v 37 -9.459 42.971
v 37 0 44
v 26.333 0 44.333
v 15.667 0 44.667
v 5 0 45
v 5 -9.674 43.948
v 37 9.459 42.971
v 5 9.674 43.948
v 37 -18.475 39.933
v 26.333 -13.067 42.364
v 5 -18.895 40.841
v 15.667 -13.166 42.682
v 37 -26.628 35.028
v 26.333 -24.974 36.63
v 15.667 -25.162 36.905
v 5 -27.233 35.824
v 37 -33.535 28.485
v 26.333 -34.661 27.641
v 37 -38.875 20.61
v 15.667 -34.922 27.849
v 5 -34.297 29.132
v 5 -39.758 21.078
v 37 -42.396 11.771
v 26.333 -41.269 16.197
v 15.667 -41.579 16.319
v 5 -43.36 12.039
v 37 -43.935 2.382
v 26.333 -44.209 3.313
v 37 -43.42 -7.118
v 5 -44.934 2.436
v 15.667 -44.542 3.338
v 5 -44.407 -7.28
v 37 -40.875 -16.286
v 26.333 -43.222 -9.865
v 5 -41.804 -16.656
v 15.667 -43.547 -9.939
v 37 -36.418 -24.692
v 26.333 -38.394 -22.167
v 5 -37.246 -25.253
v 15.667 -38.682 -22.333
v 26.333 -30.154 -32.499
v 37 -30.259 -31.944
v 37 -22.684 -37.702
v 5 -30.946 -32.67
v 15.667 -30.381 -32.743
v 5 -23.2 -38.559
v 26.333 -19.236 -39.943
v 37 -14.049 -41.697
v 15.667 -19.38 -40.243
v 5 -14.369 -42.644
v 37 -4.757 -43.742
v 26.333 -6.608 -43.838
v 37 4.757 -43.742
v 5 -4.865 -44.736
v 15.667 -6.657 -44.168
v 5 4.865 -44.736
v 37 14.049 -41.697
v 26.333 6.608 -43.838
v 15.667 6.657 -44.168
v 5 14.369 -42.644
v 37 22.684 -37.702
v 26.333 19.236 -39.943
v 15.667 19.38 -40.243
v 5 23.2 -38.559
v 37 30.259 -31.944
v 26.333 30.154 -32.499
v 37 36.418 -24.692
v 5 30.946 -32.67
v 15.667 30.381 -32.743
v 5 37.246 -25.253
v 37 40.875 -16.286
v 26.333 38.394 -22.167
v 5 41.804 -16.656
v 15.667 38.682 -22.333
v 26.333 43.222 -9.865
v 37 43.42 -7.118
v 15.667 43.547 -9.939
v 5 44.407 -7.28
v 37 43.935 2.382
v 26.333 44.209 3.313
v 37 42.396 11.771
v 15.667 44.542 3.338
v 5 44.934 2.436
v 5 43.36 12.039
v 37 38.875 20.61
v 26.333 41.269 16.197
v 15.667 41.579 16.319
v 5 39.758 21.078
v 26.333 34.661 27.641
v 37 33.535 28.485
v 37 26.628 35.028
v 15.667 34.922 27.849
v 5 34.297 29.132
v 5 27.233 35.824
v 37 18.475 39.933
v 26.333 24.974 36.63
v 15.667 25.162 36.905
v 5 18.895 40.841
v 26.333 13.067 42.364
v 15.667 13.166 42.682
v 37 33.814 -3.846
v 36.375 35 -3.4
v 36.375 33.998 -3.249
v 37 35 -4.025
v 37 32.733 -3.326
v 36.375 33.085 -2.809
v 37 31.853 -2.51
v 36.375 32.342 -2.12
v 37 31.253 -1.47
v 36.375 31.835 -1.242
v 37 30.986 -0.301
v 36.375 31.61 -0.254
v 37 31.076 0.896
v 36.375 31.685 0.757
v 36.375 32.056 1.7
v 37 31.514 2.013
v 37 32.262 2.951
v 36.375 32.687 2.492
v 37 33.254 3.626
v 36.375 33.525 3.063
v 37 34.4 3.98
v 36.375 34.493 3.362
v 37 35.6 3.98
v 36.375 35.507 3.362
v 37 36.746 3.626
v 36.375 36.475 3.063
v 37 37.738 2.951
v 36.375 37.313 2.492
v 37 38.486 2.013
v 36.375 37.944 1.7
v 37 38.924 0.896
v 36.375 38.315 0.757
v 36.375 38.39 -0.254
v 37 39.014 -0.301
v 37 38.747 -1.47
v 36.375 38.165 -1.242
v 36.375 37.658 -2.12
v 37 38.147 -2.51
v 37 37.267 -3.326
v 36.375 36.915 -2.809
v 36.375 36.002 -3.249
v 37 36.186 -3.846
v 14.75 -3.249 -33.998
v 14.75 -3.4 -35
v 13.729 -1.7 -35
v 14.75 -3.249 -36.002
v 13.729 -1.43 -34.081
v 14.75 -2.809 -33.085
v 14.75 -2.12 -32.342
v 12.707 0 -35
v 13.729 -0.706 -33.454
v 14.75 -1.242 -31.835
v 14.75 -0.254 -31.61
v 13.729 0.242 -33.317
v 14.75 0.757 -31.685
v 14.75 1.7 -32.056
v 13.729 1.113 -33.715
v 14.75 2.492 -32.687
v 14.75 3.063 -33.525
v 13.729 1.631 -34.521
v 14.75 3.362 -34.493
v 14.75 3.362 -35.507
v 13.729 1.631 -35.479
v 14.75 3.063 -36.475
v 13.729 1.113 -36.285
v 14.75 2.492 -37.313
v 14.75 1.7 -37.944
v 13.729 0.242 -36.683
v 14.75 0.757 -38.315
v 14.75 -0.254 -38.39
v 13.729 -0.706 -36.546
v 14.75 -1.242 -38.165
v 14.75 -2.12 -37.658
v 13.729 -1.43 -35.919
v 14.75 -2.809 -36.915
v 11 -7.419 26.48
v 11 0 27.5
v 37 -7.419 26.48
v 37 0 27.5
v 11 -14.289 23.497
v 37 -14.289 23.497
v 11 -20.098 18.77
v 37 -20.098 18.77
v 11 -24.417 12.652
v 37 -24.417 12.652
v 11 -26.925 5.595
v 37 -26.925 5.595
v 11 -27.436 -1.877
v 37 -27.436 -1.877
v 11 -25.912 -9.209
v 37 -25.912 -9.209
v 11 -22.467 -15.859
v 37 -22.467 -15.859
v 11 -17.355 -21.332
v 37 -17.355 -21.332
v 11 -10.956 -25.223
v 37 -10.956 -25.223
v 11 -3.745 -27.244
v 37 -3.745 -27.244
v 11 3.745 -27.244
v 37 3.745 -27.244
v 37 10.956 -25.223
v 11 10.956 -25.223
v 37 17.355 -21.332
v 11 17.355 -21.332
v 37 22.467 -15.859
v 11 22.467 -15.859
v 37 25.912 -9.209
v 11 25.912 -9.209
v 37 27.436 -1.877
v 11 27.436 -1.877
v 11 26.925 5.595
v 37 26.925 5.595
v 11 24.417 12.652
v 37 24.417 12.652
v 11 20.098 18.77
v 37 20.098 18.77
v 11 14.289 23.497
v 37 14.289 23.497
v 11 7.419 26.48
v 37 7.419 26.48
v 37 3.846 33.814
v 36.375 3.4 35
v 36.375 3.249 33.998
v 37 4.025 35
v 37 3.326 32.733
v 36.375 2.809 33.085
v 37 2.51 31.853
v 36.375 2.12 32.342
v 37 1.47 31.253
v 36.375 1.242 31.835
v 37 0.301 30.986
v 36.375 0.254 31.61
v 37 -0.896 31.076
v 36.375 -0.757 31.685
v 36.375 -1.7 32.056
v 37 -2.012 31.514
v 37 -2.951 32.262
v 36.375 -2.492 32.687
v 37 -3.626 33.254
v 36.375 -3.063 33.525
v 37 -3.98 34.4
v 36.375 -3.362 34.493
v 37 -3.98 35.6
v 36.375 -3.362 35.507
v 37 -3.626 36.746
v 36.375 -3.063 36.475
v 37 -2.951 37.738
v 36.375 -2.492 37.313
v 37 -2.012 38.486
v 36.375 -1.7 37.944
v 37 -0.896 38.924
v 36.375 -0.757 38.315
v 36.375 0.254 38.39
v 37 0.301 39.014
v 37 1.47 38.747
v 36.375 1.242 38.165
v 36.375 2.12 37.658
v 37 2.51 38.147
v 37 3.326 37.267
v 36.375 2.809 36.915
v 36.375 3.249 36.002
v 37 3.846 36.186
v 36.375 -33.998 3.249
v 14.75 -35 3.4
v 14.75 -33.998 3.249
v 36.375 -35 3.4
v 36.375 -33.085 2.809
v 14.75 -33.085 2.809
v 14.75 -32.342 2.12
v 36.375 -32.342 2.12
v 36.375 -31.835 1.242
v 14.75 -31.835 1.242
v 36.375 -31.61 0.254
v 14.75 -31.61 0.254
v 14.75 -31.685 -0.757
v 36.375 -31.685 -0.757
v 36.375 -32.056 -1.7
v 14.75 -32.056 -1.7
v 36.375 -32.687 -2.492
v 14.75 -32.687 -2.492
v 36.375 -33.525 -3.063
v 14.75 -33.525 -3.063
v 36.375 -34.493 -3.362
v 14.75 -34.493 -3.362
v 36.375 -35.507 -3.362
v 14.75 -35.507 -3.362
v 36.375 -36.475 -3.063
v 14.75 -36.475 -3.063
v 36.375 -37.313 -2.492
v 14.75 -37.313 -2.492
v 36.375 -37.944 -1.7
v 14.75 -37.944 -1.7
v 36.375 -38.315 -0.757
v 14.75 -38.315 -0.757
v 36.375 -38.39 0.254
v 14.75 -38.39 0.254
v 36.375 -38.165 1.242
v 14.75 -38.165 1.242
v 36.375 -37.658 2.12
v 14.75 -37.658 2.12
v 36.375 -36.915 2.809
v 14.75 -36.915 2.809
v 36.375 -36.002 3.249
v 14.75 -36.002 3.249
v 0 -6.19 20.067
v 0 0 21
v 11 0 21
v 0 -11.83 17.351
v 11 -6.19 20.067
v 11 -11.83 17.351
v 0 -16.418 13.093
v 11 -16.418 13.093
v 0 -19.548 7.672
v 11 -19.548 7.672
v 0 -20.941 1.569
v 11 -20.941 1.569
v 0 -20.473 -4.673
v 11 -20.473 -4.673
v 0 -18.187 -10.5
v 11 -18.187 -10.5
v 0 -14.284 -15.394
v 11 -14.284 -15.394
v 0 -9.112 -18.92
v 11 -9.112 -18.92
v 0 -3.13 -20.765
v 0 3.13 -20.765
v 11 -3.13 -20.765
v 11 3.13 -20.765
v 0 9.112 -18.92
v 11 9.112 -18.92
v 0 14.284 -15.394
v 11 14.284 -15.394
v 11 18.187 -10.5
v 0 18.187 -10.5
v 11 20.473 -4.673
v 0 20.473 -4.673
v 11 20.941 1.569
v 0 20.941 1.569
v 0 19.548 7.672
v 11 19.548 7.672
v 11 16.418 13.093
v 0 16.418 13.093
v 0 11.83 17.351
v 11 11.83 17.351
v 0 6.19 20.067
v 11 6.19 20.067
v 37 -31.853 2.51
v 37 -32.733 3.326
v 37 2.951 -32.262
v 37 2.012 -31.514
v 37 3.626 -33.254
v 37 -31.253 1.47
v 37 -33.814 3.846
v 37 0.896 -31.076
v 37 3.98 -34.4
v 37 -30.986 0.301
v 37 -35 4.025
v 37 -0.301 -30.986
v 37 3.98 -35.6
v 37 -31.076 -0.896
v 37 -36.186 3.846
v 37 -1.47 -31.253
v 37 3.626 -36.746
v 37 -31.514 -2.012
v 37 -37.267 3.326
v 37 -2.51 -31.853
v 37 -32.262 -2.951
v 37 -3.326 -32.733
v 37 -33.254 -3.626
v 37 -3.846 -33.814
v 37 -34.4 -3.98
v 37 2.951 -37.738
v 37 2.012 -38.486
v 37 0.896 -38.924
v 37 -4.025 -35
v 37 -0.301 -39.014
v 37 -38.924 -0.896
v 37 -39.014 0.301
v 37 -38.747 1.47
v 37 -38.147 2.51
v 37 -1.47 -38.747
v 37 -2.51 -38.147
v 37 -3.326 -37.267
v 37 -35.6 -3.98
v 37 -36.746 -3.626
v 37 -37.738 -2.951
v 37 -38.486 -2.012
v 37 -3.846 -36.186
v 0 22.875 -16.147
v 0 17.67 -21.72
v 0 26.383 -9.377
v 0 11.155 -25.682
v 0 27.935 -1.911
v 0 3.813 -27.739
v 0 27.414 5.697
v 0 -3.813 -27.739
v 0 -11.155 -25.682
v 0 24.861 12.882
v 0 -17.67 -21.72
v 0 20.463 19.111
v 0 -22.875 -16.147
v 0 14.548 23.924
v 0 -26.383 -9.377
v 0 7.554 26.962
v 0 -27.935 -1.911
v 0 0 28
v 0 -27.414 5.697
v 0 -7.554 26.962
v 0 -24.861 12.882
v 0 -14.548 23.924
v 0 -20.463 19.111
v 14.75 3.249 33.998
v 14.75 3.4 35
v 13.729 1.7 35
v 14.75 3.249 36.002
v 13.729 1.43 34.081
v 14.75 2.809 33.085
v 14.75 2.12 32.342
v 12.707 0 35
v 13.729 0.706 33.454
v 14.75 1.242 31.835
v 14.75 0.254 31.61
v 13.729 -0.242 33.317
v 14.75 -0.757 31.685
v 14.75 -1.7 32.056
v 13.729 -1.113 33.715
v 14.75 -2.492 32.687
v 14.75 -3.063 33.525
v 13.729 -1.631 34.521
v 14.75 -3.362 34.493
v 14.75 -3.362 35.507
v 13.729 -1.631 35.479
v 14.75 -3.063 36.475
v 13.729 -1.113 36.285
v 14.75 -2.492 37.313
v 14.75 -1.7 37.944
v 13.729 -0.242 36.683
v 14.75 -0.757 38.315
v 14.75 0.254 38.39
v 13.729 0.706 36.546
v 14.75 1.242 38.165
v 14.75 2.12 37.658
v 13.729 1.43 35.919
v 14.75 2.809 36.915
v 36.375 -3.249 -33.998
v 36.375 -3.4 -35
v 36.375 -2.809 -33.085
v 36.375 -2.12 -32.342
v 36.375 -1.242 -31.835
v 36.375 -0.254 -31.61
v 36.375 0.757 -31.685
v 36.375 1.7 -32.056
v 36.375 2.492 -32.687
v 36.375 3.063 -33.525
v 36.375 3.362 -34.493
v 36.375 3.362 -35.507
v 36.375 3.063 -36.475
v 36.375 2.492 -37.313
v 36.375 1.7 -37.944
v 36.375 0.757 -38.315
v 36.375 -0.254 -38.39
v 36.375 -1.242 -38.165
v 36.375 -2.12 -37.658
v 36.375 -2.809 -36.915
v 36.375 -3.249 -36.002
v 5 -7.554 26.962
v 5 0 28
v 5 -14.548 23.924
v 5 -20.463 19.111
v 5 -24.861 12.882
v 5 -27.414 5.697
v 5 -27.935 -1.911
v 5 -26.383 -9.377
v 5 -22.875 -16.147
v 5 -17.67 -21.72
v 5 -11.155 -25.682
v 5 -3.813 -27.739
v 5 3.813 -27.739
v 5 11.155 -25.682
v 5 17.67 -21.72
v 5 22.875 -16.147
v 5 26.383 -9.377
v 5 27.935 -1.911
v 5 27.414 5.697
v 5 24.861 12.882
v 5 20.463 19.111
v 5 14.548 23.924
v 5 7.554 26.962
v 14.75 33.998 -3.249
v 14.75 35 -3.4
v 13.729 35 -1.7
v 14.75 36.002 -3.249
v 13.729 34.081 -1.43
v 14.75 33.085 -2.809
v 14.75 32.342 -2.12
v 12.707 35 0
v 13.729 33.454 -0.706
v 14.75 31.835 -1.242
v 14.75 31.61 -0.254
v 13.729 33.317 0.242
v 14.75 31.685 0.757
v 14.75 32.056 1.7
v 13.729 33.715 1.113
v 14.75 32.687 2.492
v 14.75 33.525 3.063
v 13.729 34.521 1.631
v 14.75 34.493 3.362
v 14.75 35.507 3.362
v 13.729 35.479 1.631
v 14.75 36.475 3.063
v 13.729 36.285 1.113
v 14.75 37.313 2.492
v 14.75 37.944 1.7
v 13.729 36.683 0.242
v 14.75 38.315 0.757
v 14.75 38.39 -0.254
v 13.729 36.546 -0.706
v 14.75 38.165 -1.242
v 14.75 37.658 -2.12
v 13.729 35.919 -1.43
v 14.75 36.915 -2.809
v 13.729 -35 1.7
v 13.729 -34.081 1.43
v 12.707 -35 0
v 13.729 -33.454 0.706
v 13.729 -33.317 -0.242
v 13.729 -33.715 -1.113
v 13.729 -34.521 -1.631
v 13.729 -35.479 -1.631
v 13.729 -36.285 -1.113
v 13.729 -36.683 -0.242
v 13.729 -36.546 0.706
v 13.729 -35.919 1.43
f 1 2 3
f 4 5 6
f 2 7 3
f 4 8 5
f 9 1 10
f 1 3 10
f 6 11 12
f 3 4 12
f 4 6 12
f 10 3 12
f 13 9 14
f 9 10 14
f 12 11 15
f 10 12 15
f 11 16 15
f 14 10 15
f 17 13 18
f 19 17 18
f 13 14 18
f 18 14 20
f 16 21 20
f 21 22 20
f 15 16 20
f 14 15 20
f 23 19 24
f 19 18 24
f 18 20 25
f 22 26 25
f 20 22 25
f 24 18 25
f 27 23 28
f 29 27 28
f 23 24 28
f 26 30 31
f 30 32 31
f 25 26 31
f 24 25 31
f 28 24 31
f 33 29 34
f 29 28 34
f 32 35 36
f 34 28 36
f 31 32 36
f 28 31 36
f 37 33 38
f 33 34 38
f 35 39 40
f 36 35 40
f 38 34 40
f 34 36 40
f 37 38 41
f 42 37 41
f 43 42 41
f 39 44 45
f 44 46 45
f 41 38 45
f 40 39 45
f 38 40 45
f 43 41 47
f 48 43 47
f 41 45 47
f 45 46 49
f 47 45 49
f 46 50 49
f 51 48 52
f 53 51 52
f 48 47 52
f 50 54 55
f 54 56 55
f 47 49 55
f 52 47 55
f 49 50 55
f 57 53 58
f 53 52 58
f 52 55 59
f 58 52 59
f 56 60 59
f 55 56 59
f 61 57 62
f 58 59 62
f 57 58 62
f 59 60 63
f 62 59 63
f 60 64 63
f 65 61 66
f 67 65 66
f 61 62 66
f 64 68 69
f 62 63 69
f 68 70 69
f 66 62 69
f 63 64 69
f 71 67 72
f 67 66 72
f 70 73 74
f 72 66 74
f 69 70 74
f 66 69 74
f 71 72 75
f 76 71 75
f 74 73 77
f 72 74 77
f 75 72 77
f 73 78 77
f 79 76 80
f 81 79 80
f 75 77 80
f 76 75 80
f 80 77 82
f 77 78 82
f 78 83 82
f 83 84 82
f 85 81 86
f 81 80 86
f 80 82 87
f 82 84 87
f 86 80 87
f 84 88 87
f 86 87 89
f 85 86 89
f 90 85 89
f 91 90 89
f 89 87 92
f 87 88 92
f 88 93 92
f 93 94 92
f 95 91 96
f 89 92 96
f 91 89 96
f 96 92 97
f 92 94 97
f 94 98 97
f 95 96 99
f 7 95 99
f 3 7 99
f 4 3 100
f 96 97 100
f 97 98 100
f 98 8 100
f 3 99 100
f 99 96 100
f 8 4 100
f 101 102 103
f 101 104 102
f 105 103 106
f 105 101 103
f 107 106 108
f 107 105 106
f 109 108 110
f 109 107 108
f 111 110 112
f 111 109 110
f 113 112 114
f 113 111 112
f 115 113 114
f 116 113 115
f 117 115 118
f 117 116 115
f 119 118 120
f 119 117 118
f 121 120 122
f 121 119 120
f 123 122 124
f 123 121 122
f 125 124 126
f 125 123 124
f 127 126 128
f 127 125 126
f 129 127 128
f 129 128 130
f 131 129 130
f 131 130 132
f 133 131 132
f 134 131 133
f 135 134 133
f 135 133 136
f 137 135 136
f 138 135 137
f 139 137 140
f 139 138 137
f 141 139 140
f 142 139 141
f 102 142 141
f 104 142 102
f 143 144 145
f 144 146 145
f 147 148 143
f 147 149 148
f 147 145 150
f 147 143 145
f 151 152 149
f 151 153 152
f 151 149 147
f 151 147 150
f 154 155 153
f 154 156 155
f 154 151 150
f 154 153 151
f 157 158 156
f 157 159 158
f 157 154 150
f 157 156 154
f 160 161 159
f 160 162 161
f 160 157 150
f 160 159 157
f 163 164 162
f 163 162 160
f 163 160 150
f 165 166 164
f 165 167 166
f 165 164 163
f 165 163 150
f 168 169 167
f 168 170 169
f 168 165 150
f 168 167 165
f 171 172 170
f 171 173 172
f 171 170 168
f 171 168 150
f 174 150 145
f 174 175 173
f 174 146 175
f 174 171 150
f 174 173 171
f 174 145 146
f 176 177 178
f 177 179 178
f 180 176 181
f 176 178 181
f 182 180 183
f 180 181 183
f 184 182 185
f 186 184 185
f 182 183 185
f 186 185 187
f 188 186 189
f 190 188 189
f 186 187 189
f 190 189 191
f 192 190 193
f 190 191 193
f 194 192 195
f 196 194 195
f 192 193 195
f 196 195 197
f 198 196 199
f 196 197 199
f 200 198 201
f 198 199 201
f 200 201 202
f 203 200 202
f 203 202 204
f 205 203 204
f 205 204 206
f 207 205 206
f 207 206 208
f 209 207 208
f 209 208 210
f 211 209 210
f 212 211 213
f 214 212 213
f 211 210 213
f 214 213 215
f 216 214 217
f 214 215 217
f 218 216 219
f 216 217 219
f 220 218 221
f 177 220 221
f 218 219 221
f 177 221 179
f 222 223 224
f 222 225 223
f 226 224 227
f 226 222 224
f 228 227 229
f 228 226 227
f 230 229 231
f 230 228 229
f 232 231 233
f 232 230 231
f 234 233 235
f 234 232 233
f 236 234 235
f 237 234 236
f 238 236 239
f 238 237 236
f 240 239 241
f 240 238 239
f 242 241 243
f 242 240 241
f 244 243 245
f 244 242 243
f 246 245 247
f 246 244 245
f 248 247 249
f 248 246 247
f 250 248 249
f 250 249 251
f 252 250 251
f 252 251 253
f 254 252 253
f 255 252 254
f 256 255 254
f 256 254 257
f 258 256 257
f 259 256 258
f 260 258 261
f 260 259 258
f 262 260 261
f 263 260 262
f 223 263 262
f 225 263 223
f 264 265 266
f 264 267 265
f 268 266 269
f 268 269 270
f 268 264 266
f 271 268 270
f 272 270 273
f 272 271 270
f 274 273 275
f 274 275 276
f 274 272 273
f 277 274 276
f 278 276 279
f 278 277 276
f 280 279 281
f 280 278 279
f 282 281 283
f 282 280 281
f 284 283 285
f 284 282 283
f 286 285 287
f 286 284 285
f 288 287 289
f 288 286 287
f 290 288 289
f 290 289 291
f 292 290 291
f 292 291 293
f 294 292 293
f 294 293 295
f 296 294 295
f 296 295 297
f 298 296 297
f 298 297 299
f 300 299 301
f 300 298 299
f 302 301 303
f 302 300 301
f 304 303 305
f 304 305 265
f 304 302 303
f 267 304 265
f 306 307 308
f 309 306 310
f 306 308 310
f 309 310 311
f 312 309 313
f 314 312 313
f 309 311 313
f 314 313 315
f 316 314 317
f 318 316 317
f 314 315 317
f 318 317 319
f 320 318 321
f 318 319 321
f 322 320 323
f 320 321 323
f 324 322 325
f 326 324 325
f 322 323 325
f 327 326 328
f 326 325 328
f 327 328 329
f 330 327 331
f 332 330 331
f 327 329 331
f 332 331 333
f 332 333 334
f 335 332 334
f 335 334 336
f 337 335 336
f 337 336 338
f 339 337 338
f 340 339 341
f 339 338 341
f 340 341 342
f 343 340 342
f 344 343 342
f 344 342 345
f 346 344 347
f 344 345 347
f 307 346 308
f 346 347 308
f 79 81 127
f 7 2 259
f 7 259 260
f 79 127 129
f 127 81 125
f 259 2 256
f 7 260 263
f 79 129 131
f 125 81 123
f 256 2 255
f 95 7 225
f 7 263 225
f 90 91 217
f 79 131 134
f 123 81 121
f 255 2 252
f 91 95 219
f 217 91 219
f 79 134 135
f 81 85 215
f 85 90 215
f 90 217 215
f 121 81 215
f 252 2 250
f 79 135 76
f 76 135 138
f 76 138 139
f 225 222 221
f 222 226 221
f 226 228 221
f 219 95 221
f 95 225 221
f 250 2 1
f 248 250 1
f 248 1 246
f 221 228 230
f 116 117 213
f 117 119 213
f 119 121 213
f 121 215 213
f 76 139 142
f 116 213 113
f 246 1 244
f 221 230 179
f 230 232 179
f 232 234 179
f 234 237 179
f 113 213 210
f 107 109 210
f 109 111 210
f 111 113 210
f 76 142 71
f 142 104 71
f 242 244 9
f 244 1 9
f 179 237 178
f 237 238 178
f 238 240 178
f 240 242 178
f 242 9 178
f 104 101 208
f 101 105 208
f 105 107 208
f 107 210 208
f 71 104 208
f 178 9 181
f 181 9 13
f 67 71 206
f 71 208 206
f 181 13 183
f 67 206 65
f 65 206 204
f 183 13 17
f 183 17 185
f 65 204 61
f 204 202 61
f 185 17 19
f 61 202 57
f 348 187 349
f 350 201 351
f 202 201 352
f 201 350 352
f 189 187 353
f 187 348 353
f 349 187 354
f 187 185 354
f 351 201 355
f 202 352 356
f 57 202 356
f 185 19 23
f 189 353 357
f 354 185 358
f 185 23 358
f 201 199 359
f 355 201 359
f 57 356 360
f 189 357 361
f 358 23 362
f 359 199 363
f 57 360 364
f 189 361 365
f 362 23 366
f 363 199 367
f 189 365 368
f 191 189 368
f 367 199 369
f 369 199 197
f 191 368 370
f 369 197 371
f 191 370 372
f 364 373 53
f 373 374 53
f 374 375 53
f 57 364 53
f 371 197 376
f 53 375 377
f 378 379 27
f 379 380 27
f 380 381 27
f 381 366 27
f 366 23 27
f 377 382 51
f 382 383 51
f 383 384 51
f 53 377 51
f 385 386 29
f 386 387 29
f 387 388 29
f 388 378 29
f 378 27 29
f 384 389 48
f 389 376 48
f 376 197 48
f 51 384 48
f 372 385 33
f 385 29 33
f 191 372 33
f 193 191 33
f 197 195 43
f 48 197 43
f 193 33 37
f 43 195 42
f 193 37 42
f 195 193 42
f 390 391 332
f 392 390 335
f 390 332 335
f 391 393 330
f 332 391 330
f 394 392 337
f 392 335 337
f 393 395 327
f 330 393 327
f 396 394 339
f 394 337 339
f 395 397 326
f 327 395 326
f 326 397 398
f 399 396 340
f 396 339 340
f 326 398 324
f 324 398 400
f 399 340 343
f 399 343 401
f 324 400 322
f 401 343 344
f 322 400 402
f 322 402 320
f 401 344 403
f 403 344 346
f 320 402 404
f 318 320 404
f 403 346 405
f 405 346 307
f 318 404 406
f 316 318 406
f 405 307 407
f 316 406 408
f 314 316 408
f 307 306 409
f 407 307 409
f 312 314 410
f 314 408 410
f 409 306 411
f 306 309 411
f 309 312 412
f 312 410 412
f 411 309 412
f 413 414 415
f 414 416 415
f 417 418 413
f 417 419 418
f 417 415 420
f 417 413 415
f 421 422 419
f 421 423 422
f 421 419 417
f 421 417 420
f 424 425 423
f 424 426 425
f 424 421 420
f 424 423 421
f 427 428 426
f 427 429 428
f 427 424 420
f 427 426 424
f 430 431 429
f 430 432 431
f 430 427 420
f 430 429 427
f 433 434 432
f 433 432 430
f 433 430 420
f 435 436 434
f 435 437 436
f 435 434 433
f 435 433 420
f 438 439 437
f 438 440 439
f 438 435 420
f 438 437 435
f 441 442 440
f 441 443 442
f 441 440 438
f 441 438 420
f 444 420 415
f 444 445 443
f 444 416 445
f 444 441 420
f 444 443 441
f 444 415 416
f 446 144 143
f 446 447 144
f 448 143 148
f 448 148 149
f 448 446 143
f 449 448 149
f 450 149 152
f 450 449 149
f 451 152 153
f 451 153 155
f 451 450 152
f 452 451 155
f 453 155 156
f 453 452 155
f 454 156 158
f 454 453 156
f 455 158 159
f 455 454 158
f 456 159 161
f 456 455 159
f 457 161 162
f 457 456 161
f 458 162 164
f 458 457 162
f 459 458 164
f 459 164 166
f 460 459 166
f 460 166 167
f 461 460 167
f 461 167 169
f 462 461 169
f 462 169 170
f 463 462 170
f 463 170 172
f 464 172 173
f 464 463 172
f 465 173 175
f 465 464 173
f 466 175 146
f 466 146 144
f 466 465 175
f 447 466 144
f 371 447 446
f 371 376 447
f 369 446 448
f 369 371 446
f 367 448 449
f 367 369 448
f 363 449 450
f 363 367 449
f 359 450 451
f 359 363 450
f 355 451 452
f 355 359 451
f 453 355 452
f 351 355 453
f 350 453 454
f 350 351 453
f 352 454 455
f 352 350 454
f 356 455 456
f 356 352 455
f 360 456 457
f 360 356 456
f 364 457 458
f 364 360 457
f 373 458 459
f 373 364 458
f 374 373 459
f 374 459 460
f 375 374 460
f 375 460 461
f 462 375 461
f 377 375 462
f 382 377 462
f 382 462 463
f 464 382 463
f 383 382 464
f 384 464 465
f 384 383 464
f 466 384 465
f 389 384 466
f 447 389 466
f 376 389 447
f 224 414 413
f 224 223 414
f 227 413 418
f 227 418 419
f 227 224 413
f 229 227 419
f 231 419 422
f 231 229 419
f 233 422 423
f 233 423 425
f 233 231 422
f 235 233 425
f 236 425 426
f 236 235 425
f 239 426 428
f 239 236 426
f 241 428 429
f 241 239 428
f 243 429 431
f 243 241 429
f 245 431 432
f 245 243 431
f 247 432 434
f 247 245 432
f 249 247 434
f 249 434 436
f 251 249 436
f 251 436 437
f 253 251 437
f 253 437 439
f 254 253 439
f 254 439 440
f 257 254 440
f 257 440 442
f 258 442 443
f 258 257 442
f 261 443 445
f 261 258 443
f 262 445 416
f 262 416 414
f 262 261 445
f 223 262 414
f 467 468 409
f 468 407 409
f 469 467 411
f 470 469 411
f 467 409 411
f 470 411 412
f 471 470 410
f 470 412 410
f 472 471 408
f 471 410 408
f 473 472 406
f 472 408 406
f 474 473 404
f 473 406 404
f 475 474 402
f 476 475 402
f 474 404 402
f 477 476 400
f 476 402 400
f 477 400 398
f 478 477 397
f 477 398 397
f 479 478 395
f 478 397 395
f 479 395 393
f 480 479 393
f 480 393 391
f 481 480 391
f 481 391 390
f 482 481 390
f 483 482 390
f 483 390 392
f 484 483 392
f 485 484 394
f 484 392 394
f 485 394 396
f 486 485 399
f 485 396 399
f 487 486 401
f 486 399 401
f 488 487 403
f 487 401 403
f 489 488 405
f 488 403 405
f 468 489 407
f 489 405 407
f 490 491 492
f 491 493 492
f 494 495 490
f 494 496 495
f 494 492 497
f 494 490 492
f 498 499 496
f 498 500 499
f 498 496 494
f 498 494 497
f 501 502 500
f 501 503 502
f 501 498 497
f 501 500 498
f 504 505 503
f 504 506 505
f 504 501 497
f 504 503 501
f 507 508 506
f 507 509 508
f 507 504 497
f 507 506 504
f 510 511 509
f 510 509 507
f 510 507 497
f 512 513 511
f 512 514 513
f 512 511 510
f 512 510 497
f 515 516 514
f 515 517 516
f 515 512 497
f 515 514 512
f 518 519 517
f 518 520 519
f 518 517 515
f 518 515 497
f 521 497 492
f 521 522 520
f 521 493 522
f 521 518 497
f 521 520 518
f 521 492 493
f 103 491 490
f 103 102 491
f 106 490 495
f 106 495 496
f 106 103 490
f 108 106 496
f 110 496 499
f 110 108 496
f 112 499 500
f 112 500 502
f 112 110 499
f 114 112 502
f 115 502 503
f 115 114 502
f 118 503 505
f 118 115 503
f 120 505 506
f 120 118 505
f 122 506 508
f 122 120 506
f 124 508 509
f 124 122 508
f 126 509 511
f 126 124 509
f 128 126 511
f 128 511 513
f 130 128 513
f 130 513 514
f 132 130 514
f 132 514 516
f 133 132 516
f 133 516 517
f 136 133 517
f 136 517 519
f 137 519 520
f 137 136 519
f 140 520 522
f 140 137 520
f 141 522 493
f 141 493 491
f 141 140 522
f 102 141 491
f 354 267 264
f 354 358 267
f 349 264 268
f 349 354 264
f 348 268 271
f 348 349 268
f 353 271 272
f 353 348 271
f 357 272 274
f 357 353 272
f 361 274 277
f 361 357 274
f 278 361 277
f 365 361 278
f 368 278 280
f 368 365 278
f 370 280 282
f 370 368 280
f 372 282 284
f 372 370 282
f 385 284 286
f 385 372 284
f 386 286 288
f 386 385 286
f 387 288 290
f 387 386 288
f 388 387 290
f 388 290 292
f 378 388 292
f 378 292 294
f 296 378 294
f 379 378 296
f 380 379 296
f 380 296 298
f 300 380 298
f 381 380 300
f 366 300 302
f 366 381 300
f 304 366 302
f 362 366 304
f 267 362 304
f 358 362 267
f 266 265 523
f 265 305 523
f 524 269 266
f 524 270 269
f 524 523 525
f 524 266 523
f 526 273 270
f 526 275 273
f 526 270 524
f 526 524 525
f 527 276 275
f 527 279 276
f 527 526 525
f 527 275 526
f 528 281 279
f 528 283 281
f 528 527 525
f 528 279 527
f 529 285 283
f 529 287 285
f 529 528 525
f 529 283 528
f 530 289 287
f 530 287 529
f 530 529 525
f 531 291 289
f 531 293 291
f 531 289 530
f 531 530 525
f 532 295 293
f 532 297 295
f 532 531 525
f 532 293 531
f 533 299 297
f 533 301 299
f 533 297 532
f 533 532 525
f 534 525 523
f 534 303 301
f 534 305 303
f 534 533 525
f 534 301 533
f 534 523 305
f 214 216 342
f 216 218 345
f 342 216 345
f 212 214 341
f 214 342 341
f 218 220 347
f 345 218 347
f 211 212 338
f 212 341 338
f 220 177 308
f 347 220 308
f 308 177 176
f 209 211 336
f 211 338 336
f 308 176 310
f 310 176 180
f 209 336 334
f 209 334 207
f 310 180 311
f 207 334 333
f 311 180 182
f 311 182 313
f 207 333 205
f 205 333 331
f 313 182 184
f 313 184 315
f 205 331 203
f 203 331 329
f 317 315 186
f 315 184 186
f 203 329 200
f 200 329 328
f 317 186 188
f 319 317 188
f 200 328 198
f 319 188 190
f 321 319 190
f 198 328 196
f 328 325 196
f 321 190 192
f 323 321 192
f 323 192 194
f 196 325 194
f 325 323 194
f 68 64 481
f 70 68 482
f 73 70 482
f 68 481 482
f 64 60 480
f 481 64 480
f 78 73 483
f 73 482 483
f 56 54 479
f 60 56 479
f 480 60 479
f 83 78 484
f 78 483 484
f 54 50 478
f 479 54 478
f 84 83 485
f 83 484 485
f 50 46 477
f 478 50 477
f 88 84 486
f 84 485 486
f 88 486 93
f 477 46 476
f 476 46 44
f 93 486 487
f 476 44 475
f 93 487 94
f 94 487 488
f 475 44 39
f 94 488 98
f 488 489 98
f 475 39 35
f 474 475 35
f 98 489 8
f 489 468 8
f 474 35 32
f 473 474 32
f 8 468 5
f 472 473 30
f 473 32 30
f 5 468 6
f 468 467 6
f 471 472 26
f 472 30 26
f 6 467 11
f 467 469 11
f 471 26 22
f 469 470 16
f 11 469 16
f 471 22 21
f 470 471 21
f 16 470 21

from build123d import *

# Parameters (mm, degrees)
CIRPATTERN1_COUNT = 4


with BuildPart() as part:
    # Sketch1 → Revolve1 (revolve)
    with BuildSketch(Plane.XY, mode=Mode.PRIVATE) as revolve1_sk:
        Polygon((0, 21), (11, 21), (11, 27.5), (37, 27.5), (37, 44), (5, 45), (5, 28), (0, 28), align=None)
    revolve(revolve1_sk.sketch.rotate(Axis((0, 0, 0), (1, 0, 0)), 90), axis=Axis((0, 0, 0), (1, 0, 0)))

    # Sketch4 → M8 Tapped Hole1 (revolve, cut)
    with BuildSketch(Plane(origin=(37, 35, 0), x_dir=(0, 0, -1), z_dir=(0, 1, 0))):
        Polygon((0, 0), (0, 24.292926105), (3.4, 22.25), (3.4, 0.625), (4.025, 0), align=None)
    m8_tapped_hole1 = revolve(axis=Axis((43.35, 35, 0), (-1, 0, 0)), mode=Mode.SUBTRACT)

    # CirPattern1: M8 Tapped Hole1 ×4 about axis
    cirpattern1_axis = Axis((0, 0, 0), (1, 0, 0))
    for i in range(1, CIRPATTERN1_COUNT):
        add(m8_tapped_hole1.rotate(cirpattern1_axis, i * 360 / CIRPATTERN1_COUNT), mode=Mode.SUBTRACT)


solid = part.part
